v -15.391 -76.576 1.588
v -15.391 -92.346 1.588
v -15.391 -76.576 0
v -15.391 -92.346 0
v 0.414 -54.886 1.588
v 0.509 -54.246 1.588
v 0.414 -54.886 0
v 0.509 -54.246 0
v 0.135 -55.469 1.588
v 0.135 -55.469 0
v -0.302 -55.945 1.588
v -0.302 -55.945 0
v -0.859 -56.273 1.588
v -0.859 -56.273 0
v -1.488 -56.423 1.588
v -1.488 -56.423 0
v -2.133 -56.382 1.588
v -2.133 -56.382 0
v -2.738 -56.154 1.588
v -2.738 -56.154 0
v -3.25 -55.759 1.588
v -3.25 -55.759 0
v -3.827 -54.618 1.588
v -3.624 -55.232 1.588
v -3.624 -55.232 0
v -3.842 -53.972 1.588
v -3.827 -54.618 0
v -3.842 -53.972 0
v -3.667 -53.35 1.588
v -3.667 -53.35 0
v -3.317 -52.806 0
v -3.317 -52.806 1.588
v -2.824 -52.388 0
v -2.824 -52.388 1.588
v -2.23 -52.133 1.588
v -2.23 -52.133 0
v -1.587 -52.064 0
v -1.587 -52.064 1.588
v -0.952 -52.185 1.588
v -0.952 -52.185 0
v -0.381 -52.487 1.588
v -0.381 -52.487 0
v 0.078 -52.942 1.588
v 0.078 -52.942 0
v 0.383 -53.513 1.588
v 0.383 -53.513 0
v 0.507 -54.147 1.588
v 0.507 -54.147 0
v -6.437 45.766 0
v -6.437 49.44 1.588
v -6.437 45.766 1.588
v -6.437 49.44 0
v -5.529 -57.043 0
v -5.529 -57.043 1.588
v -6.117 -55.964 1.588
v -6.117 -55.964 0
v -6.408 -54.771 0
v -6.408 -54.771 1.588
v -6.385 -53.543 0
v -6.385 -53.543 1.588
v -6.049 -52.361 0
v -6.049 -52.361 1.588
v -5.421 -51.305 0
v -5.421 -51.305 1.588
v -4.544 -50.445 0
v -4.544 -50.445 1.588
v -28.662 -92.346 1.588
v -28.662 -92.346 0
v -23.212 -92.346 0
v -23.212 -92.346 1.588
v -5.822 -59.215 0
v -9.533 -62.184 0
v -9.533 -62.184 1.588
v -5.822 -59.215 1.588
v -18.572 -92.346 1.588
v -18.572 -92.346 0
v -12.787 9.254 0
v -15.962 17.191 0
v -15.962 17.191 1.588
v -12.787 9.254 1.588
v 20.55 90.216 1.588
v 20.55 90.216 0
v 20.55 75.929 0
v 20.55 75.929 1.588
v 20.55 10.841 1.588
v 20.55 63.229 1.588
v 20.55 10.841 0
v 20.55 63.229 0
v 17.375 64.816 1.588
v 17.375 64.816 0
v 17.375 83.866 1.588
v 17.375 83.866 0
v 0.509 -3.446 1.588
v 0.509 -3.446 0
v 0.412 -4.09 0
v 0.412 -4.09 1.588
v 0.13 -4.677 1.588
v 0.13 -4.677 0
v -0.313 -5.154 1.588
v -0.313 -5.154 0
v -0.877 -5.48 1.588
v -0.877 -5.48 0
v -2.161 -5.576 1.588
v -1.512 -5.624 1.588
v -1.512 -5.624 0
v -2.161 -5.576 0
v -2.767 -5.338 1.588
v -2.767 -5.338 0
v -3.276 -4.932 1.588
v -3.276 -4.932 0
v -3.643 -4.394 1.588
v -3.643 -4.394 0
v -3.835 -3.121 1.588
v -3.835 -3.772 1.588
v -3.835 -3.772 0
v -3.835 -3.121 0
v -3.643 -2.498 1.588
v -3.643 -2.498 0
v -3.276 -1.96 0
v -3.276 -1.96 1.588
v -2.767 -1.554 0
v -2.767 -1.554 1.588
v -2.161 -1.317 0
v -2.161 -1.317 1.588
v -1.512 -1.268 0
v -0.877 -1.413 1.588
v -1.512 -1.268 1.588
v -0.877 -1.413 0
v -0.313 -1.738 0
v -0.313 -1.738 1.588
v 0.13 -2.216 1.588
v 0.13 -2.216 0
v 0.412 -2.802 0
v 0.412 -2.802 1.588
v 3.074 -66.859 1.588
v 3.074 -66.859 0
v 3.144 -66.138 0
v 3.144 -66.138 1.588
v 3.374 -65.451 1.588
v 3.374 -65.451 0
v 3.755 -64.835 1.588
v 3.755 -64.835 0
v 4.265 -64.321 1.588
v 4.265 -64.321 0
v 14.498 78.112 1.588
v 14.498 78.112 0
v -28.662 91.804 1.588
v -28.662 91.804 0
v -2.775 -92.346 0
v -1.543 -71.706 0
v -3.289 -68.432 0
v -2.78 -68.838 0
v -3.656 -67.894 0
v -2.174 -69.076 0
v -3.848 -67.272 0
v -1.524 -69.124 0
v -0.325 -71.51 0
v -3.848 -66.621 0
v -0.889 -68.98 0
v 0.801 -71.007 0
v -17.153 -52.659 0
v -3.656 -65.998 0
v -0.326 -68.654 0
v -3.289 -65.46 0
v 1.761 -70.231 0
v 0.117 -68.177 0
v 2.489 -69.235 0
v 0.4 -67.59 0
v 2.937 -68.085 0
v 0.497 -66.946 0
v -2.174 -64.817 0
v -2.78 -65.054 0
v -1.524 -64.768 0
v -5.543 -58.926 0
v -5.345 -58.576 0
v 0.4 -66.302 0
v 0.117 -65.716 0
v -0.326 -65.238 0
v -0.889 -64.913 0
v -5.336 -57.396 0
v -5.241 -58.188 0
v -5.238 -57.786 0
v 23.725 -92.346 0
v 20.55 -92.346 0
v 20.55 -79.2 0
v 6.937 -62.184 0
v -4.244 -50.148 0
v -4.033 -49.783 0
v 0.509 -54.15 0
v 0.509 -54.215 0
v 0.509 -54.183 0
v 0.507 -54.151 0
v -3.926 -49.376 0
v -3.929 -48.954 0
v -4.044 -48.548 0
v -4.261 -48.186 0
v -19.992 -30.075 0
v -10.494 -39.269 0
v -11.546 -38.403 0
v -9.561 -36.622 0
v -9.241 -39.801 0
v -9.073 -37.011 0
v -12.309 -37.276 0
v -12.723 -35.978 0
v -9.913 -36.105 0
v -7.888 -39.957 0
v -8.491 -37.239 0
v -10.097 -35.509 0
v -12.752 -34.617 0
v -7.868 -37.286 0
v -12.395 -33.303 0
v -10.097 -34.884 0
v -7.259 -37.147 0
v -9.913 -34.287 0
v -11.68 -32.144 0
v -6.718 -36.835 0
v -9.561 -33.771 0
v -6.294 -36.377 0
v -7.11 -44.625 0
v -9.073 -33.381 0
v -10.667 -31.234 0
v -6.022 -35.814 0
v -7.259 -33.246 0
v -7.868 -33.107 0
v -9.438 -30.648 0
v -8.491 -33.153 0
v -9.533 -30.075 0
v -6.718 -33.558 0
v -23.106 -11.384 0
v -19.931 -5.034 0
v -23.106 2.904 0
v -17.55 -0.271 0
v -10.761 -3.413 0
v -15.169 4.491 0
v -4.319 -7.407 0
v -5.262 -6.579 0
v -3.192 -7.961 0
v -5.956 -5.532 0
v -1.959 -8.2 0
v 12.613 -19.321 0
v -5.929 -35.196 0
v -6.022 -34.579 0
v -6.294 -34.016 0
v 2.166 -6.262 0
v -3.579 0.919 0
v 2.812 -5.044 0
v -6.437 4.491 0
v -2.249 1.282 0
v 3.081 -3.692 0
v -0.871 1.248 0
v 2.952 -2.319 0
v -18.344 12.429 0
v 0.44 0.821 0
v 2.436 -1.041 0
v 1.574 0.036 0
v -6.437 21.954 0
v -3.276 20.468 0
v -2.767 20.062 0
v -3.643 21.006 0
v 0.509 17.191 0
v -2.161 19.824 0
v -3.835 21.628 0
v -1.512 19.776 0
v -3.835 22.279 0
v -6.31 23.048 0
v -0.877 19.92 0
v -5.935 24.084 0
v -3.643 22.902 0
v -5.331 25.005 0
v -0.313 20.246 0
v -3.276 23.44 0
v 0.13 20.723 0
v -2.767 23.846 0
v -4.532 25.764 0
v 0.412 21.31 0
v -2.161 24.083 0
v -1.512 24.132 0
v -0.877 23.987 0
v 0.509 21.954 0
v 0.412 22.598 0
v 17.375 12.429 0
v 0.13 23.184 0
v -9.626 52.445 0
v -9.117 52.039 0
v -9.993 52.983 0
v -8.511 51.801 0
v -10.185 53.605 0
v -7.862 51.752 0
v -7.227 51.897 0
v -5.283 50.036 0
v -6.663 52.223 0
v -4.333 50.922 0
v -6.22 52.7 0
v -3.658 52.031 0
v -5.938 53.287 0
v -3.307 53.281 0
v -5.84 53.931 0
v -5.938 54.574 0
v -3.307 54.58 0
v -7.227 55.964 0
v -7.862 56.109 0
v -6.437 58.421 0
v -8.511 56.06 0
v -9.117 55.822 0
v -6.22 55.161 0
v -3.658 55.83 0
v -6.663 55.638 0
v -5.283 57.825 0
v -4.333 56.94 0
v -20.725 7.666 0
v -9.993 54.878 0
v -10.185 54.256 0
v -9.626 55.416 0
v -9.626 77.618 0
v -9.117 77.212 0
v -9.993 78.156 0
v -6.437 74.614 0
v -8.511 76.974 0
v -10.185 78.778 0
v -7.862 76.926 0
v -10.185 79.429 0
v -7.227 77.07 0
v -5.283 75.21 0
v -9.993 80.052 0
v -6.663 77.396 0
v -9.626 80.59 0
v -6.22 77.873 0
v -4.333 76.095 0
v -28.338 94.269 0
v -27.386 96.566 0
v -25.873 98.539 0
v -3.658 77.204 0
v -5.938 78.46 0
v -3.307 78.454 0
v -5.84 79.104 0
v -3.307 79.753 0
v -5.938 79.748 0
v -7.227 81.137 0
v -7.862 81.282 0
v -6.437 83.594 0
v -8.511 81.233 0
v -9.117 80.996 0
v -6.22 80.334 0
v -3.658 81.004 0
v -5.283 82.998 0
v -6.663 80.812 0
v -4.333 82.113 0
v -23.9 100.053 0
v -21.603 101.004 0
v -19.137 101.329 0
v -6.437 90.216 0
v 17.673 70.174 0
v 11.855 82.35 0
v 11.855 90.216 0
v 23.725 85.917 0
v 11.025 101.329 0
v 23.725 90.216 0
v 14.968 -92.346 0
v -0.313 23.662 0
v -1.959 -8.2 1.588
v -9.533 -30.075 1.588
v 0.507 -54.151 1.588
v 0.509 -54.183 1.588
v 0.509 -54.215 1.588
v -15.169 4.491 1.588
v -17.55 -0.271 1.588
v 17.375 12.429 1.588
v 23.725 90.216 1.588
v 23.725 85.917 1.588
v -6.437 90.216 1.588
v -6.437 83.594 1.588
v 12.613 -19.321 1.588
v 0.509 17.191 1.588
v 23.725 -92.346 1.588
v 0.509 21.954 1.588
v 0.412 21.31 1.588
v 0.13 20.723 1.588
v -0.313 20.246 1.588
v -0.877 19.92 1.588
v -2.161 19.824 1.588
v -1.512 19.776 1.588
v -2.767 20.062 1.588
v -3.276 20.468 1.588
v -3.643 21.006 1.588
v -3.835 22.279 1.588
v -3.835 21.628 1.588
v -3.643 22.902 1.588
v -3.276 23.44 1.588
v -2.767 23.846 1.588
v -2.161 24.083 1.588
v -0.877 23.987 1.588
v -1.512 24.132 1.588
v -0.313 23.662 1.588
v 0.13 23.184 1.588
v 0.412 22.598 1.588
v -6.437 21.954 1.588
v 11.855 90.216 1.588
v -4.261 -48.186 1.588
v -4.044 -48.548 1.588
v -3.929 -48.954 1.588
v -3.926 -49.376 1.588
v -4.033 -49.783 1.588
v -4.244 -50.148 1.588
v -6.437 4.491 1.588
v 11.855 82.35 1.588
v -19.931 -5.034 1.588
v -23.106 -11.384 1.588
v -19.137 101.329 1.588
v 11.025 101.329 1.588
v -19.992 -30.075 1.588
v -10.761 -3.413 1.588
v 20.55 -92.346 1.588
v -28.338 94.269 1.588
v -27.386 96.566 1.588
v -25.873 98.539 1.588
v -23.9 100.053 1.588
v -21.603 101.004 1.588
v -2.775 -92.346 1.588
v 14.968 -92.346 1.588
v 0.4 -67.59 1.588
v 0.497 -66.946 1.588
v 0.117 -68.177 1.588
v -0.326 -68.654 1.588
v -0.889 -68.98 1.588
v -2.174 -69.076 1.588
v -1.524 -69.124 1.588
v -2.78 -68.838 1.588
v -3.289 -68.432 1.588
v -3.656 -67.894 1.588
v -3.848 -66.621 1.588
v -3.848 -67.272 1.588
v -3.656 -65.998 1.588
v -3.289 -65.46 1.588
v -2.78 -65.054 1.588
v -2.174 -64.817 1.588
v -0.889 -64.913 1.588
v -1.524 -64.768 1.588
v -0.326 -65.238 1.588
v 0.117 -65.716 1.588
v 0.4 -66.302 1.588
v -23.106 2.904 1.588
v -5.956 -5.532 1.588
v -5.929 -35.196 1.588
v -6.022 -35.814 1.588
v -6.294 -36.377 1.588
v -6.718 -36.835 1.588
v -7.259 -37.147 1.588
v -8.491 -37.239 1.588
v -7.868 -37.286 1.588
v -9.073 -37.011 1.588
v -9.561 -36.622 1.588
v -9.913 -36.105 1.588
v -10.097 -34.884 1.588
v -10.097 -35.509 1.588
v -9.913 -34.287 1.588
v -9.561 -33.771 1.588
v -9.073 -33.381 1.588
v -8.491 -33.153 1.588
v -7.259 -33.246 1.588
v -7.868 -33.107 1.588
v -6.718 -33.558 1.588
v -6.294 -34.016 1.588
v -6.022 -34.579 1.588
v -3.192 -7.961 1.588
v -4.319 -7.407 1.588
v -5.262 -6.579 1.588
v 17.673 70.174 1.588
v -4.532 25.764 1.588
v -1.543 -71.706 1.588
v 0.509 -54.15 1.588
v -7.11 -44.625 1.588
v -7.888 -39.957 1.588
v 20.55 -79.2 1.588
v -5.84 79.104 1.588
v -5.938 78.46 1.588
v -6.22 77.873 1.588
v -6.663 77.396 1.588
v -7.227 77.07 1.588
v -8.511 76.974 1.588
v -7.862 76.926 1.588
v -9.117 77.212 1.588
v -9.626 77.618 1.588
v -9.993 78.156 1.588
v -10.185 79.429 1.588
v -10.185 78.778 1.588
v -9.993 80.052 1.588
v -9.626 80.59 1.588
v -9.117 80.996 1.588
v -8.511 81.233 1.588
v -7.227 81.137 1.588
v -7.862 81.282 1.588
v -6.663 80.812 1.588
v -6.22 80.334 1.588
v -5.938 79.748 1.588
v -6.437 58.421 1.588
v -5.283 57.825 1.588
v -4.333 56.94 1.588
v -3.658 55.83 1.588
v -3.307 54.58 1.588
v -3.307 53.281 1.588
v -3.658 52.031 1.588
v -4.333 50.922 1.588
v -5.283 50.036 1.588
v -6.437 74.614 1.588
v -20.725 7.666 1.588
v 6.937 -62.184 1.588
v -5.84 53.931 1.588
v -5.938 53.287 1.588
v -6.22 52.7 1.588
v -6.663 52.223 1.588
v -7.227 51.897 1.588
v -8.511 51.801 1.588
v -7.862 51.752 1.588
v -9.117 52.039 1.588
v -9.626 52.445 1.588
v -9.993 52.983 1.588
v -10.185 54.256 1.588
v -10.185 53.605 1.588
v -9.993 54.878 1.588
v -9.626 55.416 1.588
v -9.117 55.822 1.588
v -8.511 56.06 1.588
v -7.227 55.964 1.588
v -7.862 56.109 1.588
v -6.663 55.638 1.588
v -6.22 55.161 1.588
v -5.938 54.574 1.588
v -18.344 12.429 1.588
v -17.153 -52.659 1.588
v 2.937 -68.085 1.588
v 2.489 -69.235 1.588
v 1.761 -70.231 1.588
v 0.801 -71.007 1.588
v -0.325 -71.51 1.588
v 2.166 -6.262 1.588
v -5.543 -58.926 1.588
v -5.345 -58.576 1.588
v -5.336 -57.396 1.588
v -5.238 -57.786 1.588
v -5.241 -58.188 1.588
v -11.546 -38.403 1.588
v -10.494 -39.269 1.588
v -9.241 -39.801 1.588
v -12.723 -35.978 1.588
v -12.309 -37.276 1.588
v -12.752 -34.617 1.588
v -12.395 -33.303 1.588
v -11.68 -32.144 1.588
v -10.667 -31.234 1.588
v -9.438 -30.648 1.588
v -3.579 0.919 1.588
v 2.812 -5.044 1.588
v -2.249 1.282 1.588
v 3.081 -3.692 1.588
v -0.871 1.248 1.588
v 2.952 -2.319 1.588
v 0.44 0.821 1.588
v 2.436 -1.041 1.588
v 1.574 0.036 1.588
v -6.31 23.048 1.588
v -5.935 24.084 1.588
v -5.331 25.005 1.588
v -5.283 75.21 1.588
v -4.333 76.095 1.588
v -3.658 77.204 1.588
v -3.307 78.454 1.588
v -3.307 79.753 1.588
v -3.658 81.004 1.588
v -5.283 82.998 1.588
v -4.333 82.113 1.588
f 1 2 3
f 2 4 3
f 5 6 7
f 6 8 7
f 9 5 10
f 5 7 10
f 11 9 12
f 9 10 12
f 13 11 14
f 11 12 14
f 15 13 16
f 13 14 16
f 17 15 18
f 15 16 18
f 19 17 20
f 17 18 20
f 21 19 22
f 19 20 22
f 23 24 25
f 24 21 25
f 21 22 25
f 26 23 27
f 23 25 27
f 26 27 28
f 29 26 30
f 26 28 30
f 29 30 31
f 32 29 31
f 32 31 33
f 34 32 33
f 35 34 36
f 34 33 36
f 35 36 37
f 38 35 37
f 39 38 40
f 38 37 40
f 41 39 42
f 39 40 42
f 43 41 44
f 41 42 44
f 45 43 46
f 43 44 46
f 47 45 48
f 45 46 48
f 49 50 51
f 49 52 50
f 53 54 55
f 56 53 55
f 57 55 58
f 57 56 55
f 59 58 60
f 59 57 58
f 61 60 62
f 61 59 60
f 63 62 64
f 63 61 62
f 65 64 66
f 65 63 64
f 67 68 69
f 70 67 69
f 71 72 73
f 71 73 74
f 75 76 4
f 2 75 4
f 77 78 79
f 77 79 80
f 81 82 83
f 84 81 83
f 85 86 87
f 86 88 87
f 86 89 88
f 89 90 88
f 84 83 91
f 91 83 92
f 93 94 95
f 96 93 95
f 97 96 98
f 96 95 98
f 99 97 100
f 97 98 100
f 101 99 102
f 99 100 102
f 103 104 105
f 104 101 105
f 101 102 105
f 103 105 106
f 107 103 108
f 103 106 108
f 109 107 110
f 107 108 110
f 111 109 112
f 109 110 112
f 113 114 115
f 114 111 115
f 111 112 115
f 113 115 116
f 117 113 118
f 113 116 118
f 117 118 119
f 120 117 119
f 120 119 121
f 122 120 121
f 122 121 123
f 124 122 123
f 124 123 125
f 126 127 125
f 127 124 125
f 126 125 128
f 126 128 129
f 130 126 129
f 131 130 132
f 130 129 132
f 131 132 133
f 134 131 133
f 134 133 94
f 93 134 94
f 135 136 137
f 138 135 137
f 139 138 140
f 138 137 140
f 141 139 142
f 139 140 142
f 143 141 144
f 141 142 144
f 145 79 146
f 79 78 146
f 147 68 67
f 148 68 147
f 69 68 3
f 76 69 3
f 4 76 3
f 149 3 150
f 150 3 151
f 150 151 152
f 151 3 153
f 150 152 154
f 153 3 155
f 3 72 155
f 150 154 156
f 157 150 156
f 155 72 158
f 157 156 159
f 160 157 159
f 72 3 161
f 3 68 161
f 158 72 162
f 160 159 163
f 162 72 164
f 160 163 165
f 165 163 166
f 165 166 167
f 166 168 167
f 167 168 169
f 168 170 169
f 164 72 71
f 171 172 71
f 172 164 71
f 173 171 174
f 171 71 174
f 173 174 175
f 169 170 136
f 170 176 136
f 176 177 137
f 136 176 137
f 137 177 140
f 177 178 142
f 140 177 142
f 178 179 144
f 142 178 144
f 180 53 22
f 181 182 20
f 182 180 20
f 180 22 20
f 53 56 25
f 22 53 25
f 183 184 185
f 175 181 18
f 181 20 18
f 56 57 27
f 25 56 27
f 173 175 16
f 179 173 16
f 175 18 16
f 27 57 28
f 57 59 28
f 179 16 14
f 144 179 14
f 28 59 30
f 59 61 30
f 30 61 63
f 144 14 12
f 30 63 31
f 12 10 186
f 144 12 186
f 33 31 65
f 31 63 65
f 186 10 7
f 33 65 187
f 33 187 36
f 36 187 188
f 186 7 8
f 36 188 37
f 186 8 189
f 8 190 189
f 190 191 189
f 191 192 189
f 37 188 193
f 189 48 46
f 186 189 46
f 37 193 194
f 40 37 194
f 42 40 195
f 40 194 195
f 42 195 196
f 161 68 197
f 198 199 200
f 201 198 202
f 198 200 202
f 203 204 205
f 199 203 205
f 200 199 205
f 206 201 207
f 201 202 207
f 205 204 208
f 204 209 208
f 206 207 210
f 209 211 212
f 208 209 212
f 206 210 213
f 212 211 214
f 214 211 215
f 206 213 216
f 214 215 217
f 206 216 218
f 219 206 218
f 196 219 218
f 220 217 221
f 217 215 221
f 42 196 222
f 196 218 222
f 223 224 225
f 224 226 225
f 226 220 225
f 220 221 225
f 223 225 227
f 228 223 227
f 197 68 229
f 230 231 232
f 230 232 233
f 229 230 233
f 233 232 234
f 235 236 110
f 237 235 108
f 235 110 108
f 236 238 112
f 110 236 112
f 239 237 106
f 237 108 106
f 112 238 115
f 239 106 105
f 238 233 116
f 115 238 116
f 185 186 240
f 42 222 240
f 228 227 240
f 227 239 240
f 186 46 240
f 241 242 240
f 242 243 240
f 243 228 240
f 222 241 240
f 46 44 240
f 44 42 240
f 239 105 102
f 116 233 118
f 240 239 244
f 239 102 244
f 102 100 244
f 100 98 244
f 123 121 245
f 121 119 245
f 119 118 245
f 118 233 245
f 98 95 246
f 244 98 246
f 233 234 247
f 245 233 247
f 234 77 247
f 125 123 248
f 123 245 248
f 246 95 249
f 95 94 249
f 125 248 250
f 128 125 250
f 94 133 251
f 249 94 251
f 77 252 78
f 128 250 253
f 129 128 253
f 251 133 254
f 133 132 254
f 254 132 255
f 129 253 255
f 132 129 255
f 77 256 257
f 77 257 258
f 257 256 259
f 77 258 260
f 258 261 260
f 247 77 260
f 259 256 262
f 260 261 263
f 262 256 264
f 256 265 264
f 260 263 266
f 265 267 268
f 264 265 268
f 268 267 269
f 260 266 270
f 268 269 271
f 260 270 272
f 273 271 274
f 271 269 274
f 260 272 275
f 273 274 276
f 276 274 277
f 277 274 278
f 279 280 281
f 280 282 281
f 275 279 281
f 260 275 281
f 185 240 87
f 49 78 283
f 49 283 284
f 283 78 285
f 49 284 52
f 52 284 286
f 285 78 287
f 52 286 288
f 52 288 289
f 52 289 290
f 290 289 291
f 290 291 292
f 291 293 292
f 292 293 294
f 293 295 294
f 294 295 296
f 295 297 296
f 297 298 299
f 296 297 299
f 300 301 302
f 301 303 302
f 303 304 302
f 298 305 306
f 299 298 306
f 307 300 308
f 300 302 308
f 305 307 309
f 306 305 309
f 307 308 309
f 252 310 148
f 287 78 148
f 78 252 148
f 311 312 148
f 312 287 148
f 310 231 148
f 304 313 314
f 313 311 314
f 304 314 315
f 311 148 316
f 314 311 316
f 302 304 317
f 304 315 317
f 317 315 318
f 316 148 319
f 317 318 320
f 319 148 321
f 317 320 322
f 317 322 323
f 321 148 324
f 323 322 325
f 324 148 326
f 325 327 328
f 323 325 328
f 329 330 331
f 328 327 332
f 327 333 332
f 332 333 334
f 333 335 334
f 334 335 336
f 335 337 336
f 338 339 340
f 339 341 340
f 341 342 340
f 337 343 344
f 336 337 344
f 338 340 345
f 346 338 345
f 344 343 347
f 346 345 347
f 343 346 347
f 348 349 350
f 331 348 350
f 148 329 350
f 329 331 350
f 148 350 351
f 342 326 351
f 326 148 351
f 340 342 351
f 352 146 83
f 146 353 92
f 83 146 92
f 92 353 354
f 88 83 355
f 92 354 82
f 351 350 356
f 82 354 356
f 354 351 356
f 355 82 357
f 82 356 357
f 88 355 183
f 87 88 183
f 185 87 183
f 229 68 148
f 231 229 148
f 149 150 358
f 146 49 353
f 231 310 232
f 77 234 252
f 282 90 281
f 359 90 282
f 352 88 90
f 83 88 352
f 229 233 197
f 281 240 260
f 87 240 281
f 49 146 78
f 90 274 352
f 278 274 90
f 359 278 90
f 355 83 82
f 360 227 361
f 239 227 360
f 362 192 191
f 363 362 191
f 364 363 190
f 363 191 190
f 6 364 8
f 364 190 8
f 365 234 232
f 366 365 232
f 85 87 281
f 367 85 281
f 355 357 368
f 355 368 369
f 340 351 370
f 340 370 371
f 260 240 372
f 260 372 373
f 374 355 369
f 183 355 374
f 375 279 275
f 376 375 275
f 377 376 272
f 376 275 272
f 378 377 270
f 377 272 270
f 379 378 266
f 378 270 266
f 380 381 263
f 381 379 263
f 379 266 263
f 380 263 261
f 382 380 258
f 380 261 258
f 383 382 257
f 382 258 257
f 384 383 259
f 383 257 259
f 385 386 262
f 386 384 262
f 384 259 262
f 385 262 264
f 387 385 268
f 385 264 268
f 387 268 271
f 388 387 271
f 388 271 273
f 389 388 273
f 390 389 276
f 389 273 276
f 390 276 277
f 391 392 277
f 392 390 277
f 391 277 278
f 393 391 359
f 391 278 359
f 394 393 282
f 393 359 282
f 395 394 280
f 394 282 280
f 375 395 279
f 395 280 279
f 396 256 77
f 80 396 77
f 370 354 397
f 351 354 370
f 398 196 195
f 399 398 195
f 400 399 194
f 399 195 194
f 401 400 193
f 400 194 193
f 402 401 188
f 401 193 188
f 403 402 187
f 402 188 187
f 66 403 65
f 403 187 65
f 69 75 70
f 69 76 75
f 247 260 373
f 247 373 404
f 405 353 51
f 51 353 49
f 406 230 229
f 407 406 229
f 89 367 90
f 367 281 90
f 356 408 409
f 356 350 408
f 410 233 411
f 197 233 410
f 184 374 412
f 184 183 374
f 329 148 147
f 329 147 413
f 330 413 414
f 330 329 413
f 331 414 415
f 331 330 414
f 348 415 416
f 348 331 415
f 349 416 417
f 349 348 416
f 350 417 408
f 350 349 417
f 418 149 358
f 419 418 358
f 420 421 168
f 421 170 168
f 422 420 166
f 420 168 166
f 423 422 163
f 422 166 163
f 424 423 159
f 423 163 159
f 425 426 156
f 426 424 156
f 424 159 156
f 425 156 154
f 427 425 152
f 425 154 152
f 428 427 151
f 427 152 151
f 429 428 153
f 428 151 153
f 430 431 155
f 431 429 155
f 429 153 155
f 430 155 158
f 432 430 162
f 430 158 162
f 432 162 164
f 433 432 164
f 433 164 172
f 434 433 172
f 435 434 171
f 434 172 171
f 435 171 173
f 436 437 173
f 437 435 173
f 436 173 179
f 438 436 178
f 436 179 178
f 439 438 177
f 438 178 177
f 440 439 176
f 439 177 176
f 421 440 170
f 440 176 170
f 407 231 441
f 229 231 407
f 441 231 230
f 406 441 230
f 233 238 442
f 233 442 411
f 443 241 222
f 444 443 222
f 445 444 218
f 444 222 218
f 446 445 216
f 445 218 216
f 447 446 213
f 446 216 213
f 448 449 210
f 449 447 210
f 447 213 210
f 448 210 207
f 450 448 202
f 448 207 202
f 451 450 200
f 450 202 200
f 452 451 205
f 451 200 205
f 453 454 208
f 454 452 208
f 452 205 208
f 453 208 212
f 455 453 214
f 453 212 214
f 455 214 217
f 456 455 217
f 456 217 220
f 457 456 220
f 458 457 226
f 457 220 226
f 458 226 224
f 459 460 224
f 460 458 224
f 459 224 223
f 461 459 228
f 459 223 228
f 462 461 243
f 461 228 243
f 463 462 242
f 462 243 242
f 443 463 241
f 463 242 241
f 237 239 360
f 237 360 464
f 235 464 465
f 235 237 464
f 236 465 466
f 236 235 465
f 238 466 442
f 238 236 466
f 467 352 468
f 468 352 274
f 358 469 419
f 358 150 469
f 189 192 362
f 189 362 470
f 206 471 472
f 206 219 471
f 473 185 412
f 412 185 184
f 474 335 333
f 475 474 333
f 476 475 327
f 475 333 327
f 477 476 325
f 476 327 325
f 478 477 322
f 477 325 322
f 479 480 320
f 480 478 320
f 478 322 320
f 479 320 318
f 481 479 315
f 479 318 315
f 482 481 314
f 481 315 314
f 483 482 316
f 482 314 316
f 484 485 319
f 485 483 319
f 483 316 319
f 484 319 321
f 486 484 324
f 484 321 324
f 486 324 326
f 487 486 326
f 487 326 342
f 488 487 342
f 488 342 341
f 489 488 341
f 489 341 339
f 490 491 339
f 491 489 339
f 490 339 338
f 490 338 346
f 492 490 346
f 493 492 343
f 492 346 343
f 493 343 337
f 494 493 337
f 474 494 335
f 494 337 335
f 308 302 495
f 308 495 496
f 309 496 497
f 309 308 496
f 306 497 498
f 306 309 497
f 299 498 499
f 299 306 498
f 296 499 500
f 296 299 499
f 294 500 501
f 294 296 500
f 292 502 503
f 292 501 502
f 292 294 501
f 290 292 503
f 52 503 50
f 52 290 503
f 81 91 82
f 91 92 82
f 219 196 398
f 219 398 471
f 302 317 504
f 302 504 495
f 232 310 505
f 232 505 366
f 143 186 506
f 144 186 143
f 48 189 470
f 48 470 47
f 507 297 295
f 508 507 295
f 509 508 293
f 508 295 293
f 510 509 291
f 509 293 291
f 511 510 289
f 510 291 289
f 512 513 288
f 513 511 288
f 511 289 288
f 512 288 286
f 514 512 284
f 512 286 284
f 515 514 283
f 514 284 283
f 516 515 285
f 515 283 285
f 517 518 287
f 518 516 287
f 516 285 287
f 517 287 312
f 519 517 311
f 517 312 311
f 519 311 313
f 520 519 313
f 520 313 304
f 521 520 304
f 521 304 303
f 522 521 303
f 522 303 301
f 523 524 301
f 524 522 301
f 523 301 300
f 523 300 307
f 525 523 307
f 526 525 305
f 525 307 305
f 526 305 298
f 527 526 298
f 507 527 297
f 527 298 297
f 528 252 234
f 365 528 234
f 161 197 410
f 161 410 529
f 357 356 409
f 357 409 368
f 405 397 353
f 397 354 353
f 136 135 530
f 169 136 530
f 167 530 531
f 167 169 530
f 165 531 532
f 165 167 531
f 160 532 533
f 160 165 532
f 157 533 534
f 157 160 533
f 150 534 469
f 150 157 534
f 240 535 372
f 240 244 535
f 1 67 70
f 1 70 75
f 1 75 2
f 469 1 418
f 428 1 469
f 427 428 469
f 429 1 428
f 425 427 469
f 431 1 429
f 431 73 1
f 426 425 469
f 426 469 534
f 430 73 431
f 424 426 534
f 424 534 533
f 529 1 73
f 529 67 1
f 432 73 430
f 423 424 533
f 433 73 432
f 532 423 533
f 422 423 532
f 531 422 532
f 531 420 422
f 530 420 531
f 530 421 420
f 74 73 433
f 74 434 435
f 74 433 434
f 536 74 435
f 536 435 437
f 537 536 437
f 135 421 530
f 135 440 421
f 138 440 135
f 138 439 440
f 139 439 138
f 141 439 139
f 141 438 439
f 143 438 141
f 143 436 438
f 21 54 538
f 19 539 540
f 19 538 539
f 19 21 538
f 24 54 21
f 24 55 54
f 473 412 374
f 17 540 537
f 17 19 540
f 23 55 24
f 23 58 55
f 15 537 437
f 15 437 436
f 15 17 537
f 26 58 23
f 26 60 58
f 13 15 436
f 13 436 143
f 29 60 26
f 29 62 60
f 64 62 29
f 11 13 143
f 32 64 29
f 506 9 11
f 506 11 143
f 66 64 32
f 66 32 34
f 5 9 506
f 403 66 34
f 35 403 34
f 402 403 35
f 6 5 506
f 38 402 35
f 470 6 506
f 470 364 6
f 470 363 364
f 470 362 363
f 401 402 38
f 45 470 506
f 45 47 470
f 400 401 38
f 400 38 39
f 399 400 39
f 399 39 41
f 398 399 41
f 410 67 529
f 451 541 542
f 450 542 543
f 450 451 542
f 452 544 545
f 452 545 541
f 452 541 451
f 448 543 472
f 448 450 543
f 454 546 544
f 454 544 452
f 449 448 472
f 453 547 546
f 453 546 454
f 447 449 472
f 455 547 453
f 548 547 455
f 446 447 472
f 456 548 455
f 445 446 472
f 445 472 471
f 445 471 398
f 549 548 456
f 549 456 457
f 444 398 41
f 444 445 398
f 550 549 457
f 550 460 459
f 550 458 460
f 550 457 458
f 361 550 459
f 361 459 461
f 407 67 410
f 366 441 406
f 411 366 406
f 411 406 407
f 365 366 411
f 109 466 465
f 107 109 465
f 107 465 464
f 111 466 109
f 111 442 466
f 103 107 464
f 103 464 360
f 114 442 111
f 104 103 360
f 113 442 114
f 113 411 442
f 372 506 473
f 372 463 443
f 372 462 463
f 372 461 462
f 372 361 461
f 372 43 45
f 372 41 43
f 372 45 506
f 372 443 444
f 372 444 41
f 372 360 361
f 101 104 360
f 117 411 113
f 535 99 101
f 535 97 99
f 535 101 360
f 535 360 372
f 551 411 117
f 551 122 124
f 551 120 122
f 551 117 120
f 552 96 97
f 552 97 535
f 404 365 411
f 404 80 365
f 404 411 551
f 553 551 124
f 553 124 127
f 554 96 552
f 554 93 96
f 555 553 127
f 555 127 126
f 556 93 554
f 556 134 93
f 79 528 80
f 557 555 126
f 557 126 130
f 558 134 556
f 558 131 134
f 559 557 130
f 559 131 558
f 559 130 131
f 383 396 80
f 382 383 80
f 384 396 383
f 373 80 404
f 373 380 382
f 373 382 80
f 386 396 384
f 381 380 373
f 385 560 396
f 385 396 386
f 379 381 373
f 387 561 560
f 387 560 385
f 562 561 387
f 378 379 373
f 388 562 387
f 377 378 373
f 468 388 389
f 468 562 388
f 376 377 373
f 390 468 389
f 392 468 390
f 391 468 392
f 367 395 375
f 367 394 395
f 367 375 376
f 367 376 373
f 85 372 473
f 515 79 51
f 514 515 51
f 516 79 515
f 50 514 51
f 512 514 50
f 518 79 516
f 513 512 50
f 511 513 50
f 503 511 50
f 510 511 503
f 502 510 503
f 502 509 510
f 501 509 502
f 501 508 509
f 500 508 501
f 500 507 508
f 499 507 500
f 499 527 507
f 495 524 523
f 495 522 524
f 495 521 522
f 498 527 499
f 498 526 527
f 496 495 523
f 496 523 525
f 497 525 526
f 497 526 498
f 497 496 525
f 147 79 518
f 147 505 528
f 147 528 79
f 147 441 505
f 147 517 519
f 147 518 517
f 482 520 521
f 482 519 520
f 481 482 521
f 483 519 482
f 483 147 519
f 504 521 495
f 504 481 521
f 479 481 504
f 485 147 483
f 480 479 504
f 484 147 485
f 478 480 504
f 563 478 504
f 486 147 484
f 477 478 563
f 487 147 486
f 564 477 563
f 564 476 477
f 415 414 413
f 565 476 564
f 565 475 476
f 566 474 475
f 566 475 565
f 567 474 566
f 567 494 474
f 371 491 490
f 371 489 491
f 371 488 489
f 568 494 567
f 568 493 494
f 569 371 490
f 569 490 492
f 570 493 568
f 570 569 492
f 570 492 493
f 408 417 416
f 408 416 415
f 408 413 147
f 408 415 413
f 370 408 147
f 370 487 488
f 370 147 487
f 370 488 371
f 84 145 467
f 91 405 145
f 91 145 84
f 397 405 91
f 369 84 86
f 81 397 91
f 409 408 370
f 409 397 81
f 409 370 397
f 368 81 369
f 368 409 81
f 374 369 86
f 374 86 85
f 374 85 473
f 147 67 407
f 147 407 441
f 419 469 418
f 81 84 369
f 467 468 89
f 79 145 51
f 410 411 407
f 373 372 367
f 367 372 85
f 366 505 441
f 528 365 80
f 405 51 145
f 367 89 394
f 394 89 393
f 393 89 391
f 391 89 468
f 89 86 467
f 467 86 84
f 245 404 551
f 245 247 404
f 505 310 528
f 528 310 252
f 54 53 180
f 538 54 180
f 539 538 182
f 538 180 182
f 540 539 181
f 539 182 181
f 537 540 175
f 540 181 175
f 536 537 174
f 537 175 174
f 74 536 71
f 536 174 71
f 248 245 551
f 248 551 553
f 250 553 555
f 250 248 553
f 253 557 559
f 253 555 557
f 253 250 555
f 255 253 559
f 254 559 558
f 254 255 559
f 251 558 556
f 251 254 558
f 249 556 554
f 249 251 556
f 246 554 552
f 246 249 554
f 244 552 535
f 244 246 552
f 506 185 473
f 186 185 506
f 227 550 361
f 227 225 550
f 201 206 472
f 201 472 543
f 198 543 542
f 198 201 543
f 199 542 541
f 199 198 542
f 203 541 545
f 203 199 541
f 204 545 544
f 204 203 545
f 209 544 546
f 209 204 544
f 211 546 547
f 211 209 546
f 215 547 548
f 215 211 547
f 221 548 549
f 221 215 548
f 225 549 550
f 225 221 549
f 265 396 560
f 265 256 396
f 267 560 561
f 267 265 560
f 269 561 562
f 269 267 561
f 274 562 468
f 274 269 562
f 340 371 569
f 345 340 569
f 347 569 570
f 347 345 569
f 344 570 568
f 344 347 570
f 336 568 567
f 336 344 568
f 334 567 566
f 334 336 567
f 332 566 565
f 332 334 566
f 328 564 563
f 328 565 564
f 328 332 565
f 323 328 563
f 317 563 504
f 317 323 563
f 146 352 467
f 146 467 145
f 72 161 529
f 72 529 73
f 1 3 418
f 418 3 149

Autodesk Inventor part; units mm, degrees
ref_plane "YZ Plane" through (0, 0, 0) normal (1, 0, 0) x (0, 1, 0)
ref_plane "XZ Plane" through (0, 0, 0) normal (0, 1, 0) x (-1, 0, 0)
ref_plane "XY Plane" through (0, 0, 0) normal (0, 0, 1) x (1, 0, 0)
sketch "Sketch1" plane through (0, 0, 0) normal (0, 0, 1) x (1, 0, 0)
  circle A0 centre (-1.6749, 21.9538) radius 2.1844
  circle A1 centre (-1.6749, -3.4462) radius 2.1844
  line L0 (23.7251, 85.917) -> (23.7251, -92.3462)
  line L1 (-28.6624, -92.3462) -> (-28.6624, 91.8038)
  line L2 (17.3751, 64.8163) -> (20.5501, 63.2288)
  line L3 (20.5501, 63.2288) -> (20.5501, 10.8413)
  line L4 (20.5501, 10.8413) -> (17.3751, 12.4288)
  line L5 (17.3751, 12.4288) -> (17.3751, 64.8163)
  line L6 (20.5501, 75.9288) -> (17.3751, 83.8663)
  line L7 (20.5501, 90.2163) -> (20.5501, 75.9288)
  line L8 (17.6728, 70.1741) -> (14.4978, 78.1116)
  line L9 (17.3751, 83.8663) -> (20.5501, 90.2163)
  line L10 (-18.3436, 12.4288) -> (-15.1686, 4.4913)
  line L11 (-15.9624, 17.1913) -> (-12.7874, 9.2538)
  line L12 (-15.9624, 17.1913) -> (14.4978, 78.1116)
  line L13 (-23.1061, 2.9038) -> (-19.9311, -5.0337)
  line L14 (-23.1061, 2.9038) -> (-23.1061, -11.3837)
  line L15 (-20.7249, 7.6663) -> (-18.3436, 12.4288)
  line L16 (-15.1686, 4.4913) -> (-17.5499, -0.2712)
  line L17 (-19.9311, -5.0337) -> (-23.1061, -11.3837)
  line L18 (11.8546, 90.2163) -> (11.8546, 82.3502)
  line L19 (11.8546, 90.2163) -> (-6.4374, 90.2163)
  line L20 (11.8546, 82.3502) -> (-6.4374, 45.7663)
  line L21 (0.5095, 17.1913) -> (-6.4374, 4.4913)
  line L22 (12.6126, -19.3212) -> (0.5095, 17.1913)
  line L23 (-10.761, -3.4129) -> (-19.992, -30.0754)
  line L24 (-19.992, -30.0754) -> (-17.153, -52.6587)
  line L25 (-17.153, -52.6587) -> (-9.533, -62.1837)
  line L26 (-9.533, -30.0754) -> (-1.9594, -8.2002)
  line L27 (-5.9563, -5.5321) -> (-10.761, -3.4129)
  line L28 (20.5501, -79.2004) -> (20.5501, -92.3462)
  line L29 (6.9368, -62.1837) -> (4.2652, -64.3209)
  line L30 (-1.5433, -71.7065) -> (14.9685, -92.3462)
  arc A2 (-1.5433, -71.7065) -> (3.0742, -66.8586) centre (-1.6875, -66.9462) ccw
  circle A3 centre (-1.6875, -66.9462) radius 2.1844
  arc A4 (4.2652, -64.3209) -> (3.0742, -66.8586) centre (6.2486, -66.8002) ccw
  line L31 (20.5501, -79.2004) -> (6.9368, -62.1837)
  line L32 (23.7251, -92.3462) -> (20.5501, -92.3462)
  circle A5 centre (-1.6749, -54.2462) radius 2.1844
  arc A6 (-4.5442, -50.4451) -> (-5.5294, -57.0433) centre (-1.6749, -54.2462) ccw
  line L33 (-9.533, -62.1837) -> (-5.8225, -59.2153)
  line L34 (0.5075, -54.1513) -> (0.5095, -54.1497)
  line L35 (0.5095, -54.1497) -> (0.5073, -54.1469)
  line L36 (-4.2611, -48.1864) -> (-7.1105, -44.6247)
  arc A7 (-4.5442, -50.4451) -> (-4.2611, -48.1864) centre (-5.5007, -49.1781) ccw
  arc A8 (-5.8225, -59.2153) -> (-5.5294, -57.0433) centre (-6.8142, -57.9757) ccw
  arc A9 (-4.5324, 25.7638) -> (-6.4374, 21.9538) centre (-1.6749, 21.9538) ccw
  line L37 (17.6728, 70.1741) -> (-4.5324, 25.7638)
  line L38 (-6.4374, 21.9538) -> (-12.7874, 9.2538)
  line L39 (-6.4374, 4.4913) -> (-3.5794, 0.9189)
  line L40 (2.1657, -6.2625) -> (12.6126, -19.3212)
  arc A10 (2.1657, -6.2625) -> (-3.5794, 0.9189) centre (-1.6749, -3.4462) ccw
  arc A11 (-5.9563, -5.5321) -> (-1.9594, -8.2002) centre (-1.6749, -3.4462) ccw
  line L41 (14.9685, -92.3462) -> (44.3118, -92.3462) construction
  line L42 (-2.7748, -92.3462) -> (14.9685, -92.3462)
  line L43 (-28.6624, -92.3462) -> (-23.2121, -92.3462)
  line L44 (-18.5725, -92.3462) -> (-28.6624, -92.3462)
  line L45 (-20.7249, 7.6663) -> (-17.5499, -0.2712)
  line L46 (-28.6624, 98.1538) -> (-28.6624, 101.3288)
  line L47 (-19.1374, 101.3288) -> (11.0251, 101.3288)
  line L48 (23.7251, 90.2163) -> (23.7251, 85.917)
  line L49 (11.0251, 101.3288) -> (23.7251, 90.2163)
  arc A12 (-19.1374, 101.3288) -> (-28.6624, 91.8038) centre (-19.1374, 91.8038) ccw
  arc A13 (-6.4374, 74.6137) -> (-6.4374, 83.5939) centre (-8.0249, 79.1038) ccw
  circle A14 centre (-8.0249, 79.1038) radius 2.1844
  line L50 (-6.4374, 90.2163) -> (-6.4374, 83.5939)
  line L51 (-18.5725, -92.3462) -> (-15.3911, -92.3462)
  line L52 (-15.3911, -92.3462) -> (-15.3911, -76.5759)
  line L53 (-15.3911, -76.5759) -> (-2.7748, -92.3462)
  arc A15 (-6.4374, 49.4405) -> (-6.4374, 58.4207) centre (-8.0249, 53.9306) ccw
  circle A16 centre (-8.0249, 53.9306) radius 2.1844
  line L54 (-6.4374, 74.6137) -> (-6.4374, 58.4207)
  line L55 (-6.4374, 49.4405) -> (-6.4374, 45.7663)
  line L56 (-1.6749, -54.2462) -> (17.3751, -54.2462) construction
  circle A17 centre (-8.0249, -35.1962) radius 2.0955
  arc A18 (-9.4376, -30.6481) -> (-7.8877, -39.9567) centre (-8.0249, -35.1962) ccw
  line L57 (-9.4376, -30.6481) -> (-9.533, -30.0754)
  line L58 (-7.1105, -44.6247) -> (-7.8877, -39.9567)
  point P0 (0, 0)
  point P1 (2.838, -65.4627)
  point P2 (-4.4495, -58.1169)
  point P3 (-3.0588, -49.6892)
  dimension "d0" = 4.3688
  dimension "d1" = 4.3688
  dimension "d3" = 9.525
  dimension "d4" = 4.3688
  dimension "d5" = 3.175
  dimension "d6" = 9.525
  dimension "d7" = 1.5875
  dimension "d8" = 9.525
  dimension "d14" = 3.175
  dimension "d15" = 9.525
  dimension "d18" = 9.525
  dimension "d19" = 4.3688
  dimension "d20" = 3.1814
  dimension "d22" = 9.525
  dimension "d23" = 4.3688
  dimension "d27" = 4.191
  dimension "d28" = 9.525
extrude "Extrusion1" add sketch "Sketch1" along normal blind 1.5875
equation "\"BendRadius\" = Thickness"
equation "\"BendReliefWidth\" = Thickness"
equation "\"BendReliefDepth\" = 0.5 * Thickness"
equation "\"CornerReliefSize\" = 4 * Thickness"
equation "\"MinimumRemnant\" = 2 * Thickness"
equation "\"TransitionRadius\" = BendRadius"
equation "\"JacobiRadiusSize\" = BendRadius"
equation "\"GapSize\" = Thickness"
equation "\"Thickness\" = 1.5875"
properties part number "sideplate" material "Acetal Resin, White"
